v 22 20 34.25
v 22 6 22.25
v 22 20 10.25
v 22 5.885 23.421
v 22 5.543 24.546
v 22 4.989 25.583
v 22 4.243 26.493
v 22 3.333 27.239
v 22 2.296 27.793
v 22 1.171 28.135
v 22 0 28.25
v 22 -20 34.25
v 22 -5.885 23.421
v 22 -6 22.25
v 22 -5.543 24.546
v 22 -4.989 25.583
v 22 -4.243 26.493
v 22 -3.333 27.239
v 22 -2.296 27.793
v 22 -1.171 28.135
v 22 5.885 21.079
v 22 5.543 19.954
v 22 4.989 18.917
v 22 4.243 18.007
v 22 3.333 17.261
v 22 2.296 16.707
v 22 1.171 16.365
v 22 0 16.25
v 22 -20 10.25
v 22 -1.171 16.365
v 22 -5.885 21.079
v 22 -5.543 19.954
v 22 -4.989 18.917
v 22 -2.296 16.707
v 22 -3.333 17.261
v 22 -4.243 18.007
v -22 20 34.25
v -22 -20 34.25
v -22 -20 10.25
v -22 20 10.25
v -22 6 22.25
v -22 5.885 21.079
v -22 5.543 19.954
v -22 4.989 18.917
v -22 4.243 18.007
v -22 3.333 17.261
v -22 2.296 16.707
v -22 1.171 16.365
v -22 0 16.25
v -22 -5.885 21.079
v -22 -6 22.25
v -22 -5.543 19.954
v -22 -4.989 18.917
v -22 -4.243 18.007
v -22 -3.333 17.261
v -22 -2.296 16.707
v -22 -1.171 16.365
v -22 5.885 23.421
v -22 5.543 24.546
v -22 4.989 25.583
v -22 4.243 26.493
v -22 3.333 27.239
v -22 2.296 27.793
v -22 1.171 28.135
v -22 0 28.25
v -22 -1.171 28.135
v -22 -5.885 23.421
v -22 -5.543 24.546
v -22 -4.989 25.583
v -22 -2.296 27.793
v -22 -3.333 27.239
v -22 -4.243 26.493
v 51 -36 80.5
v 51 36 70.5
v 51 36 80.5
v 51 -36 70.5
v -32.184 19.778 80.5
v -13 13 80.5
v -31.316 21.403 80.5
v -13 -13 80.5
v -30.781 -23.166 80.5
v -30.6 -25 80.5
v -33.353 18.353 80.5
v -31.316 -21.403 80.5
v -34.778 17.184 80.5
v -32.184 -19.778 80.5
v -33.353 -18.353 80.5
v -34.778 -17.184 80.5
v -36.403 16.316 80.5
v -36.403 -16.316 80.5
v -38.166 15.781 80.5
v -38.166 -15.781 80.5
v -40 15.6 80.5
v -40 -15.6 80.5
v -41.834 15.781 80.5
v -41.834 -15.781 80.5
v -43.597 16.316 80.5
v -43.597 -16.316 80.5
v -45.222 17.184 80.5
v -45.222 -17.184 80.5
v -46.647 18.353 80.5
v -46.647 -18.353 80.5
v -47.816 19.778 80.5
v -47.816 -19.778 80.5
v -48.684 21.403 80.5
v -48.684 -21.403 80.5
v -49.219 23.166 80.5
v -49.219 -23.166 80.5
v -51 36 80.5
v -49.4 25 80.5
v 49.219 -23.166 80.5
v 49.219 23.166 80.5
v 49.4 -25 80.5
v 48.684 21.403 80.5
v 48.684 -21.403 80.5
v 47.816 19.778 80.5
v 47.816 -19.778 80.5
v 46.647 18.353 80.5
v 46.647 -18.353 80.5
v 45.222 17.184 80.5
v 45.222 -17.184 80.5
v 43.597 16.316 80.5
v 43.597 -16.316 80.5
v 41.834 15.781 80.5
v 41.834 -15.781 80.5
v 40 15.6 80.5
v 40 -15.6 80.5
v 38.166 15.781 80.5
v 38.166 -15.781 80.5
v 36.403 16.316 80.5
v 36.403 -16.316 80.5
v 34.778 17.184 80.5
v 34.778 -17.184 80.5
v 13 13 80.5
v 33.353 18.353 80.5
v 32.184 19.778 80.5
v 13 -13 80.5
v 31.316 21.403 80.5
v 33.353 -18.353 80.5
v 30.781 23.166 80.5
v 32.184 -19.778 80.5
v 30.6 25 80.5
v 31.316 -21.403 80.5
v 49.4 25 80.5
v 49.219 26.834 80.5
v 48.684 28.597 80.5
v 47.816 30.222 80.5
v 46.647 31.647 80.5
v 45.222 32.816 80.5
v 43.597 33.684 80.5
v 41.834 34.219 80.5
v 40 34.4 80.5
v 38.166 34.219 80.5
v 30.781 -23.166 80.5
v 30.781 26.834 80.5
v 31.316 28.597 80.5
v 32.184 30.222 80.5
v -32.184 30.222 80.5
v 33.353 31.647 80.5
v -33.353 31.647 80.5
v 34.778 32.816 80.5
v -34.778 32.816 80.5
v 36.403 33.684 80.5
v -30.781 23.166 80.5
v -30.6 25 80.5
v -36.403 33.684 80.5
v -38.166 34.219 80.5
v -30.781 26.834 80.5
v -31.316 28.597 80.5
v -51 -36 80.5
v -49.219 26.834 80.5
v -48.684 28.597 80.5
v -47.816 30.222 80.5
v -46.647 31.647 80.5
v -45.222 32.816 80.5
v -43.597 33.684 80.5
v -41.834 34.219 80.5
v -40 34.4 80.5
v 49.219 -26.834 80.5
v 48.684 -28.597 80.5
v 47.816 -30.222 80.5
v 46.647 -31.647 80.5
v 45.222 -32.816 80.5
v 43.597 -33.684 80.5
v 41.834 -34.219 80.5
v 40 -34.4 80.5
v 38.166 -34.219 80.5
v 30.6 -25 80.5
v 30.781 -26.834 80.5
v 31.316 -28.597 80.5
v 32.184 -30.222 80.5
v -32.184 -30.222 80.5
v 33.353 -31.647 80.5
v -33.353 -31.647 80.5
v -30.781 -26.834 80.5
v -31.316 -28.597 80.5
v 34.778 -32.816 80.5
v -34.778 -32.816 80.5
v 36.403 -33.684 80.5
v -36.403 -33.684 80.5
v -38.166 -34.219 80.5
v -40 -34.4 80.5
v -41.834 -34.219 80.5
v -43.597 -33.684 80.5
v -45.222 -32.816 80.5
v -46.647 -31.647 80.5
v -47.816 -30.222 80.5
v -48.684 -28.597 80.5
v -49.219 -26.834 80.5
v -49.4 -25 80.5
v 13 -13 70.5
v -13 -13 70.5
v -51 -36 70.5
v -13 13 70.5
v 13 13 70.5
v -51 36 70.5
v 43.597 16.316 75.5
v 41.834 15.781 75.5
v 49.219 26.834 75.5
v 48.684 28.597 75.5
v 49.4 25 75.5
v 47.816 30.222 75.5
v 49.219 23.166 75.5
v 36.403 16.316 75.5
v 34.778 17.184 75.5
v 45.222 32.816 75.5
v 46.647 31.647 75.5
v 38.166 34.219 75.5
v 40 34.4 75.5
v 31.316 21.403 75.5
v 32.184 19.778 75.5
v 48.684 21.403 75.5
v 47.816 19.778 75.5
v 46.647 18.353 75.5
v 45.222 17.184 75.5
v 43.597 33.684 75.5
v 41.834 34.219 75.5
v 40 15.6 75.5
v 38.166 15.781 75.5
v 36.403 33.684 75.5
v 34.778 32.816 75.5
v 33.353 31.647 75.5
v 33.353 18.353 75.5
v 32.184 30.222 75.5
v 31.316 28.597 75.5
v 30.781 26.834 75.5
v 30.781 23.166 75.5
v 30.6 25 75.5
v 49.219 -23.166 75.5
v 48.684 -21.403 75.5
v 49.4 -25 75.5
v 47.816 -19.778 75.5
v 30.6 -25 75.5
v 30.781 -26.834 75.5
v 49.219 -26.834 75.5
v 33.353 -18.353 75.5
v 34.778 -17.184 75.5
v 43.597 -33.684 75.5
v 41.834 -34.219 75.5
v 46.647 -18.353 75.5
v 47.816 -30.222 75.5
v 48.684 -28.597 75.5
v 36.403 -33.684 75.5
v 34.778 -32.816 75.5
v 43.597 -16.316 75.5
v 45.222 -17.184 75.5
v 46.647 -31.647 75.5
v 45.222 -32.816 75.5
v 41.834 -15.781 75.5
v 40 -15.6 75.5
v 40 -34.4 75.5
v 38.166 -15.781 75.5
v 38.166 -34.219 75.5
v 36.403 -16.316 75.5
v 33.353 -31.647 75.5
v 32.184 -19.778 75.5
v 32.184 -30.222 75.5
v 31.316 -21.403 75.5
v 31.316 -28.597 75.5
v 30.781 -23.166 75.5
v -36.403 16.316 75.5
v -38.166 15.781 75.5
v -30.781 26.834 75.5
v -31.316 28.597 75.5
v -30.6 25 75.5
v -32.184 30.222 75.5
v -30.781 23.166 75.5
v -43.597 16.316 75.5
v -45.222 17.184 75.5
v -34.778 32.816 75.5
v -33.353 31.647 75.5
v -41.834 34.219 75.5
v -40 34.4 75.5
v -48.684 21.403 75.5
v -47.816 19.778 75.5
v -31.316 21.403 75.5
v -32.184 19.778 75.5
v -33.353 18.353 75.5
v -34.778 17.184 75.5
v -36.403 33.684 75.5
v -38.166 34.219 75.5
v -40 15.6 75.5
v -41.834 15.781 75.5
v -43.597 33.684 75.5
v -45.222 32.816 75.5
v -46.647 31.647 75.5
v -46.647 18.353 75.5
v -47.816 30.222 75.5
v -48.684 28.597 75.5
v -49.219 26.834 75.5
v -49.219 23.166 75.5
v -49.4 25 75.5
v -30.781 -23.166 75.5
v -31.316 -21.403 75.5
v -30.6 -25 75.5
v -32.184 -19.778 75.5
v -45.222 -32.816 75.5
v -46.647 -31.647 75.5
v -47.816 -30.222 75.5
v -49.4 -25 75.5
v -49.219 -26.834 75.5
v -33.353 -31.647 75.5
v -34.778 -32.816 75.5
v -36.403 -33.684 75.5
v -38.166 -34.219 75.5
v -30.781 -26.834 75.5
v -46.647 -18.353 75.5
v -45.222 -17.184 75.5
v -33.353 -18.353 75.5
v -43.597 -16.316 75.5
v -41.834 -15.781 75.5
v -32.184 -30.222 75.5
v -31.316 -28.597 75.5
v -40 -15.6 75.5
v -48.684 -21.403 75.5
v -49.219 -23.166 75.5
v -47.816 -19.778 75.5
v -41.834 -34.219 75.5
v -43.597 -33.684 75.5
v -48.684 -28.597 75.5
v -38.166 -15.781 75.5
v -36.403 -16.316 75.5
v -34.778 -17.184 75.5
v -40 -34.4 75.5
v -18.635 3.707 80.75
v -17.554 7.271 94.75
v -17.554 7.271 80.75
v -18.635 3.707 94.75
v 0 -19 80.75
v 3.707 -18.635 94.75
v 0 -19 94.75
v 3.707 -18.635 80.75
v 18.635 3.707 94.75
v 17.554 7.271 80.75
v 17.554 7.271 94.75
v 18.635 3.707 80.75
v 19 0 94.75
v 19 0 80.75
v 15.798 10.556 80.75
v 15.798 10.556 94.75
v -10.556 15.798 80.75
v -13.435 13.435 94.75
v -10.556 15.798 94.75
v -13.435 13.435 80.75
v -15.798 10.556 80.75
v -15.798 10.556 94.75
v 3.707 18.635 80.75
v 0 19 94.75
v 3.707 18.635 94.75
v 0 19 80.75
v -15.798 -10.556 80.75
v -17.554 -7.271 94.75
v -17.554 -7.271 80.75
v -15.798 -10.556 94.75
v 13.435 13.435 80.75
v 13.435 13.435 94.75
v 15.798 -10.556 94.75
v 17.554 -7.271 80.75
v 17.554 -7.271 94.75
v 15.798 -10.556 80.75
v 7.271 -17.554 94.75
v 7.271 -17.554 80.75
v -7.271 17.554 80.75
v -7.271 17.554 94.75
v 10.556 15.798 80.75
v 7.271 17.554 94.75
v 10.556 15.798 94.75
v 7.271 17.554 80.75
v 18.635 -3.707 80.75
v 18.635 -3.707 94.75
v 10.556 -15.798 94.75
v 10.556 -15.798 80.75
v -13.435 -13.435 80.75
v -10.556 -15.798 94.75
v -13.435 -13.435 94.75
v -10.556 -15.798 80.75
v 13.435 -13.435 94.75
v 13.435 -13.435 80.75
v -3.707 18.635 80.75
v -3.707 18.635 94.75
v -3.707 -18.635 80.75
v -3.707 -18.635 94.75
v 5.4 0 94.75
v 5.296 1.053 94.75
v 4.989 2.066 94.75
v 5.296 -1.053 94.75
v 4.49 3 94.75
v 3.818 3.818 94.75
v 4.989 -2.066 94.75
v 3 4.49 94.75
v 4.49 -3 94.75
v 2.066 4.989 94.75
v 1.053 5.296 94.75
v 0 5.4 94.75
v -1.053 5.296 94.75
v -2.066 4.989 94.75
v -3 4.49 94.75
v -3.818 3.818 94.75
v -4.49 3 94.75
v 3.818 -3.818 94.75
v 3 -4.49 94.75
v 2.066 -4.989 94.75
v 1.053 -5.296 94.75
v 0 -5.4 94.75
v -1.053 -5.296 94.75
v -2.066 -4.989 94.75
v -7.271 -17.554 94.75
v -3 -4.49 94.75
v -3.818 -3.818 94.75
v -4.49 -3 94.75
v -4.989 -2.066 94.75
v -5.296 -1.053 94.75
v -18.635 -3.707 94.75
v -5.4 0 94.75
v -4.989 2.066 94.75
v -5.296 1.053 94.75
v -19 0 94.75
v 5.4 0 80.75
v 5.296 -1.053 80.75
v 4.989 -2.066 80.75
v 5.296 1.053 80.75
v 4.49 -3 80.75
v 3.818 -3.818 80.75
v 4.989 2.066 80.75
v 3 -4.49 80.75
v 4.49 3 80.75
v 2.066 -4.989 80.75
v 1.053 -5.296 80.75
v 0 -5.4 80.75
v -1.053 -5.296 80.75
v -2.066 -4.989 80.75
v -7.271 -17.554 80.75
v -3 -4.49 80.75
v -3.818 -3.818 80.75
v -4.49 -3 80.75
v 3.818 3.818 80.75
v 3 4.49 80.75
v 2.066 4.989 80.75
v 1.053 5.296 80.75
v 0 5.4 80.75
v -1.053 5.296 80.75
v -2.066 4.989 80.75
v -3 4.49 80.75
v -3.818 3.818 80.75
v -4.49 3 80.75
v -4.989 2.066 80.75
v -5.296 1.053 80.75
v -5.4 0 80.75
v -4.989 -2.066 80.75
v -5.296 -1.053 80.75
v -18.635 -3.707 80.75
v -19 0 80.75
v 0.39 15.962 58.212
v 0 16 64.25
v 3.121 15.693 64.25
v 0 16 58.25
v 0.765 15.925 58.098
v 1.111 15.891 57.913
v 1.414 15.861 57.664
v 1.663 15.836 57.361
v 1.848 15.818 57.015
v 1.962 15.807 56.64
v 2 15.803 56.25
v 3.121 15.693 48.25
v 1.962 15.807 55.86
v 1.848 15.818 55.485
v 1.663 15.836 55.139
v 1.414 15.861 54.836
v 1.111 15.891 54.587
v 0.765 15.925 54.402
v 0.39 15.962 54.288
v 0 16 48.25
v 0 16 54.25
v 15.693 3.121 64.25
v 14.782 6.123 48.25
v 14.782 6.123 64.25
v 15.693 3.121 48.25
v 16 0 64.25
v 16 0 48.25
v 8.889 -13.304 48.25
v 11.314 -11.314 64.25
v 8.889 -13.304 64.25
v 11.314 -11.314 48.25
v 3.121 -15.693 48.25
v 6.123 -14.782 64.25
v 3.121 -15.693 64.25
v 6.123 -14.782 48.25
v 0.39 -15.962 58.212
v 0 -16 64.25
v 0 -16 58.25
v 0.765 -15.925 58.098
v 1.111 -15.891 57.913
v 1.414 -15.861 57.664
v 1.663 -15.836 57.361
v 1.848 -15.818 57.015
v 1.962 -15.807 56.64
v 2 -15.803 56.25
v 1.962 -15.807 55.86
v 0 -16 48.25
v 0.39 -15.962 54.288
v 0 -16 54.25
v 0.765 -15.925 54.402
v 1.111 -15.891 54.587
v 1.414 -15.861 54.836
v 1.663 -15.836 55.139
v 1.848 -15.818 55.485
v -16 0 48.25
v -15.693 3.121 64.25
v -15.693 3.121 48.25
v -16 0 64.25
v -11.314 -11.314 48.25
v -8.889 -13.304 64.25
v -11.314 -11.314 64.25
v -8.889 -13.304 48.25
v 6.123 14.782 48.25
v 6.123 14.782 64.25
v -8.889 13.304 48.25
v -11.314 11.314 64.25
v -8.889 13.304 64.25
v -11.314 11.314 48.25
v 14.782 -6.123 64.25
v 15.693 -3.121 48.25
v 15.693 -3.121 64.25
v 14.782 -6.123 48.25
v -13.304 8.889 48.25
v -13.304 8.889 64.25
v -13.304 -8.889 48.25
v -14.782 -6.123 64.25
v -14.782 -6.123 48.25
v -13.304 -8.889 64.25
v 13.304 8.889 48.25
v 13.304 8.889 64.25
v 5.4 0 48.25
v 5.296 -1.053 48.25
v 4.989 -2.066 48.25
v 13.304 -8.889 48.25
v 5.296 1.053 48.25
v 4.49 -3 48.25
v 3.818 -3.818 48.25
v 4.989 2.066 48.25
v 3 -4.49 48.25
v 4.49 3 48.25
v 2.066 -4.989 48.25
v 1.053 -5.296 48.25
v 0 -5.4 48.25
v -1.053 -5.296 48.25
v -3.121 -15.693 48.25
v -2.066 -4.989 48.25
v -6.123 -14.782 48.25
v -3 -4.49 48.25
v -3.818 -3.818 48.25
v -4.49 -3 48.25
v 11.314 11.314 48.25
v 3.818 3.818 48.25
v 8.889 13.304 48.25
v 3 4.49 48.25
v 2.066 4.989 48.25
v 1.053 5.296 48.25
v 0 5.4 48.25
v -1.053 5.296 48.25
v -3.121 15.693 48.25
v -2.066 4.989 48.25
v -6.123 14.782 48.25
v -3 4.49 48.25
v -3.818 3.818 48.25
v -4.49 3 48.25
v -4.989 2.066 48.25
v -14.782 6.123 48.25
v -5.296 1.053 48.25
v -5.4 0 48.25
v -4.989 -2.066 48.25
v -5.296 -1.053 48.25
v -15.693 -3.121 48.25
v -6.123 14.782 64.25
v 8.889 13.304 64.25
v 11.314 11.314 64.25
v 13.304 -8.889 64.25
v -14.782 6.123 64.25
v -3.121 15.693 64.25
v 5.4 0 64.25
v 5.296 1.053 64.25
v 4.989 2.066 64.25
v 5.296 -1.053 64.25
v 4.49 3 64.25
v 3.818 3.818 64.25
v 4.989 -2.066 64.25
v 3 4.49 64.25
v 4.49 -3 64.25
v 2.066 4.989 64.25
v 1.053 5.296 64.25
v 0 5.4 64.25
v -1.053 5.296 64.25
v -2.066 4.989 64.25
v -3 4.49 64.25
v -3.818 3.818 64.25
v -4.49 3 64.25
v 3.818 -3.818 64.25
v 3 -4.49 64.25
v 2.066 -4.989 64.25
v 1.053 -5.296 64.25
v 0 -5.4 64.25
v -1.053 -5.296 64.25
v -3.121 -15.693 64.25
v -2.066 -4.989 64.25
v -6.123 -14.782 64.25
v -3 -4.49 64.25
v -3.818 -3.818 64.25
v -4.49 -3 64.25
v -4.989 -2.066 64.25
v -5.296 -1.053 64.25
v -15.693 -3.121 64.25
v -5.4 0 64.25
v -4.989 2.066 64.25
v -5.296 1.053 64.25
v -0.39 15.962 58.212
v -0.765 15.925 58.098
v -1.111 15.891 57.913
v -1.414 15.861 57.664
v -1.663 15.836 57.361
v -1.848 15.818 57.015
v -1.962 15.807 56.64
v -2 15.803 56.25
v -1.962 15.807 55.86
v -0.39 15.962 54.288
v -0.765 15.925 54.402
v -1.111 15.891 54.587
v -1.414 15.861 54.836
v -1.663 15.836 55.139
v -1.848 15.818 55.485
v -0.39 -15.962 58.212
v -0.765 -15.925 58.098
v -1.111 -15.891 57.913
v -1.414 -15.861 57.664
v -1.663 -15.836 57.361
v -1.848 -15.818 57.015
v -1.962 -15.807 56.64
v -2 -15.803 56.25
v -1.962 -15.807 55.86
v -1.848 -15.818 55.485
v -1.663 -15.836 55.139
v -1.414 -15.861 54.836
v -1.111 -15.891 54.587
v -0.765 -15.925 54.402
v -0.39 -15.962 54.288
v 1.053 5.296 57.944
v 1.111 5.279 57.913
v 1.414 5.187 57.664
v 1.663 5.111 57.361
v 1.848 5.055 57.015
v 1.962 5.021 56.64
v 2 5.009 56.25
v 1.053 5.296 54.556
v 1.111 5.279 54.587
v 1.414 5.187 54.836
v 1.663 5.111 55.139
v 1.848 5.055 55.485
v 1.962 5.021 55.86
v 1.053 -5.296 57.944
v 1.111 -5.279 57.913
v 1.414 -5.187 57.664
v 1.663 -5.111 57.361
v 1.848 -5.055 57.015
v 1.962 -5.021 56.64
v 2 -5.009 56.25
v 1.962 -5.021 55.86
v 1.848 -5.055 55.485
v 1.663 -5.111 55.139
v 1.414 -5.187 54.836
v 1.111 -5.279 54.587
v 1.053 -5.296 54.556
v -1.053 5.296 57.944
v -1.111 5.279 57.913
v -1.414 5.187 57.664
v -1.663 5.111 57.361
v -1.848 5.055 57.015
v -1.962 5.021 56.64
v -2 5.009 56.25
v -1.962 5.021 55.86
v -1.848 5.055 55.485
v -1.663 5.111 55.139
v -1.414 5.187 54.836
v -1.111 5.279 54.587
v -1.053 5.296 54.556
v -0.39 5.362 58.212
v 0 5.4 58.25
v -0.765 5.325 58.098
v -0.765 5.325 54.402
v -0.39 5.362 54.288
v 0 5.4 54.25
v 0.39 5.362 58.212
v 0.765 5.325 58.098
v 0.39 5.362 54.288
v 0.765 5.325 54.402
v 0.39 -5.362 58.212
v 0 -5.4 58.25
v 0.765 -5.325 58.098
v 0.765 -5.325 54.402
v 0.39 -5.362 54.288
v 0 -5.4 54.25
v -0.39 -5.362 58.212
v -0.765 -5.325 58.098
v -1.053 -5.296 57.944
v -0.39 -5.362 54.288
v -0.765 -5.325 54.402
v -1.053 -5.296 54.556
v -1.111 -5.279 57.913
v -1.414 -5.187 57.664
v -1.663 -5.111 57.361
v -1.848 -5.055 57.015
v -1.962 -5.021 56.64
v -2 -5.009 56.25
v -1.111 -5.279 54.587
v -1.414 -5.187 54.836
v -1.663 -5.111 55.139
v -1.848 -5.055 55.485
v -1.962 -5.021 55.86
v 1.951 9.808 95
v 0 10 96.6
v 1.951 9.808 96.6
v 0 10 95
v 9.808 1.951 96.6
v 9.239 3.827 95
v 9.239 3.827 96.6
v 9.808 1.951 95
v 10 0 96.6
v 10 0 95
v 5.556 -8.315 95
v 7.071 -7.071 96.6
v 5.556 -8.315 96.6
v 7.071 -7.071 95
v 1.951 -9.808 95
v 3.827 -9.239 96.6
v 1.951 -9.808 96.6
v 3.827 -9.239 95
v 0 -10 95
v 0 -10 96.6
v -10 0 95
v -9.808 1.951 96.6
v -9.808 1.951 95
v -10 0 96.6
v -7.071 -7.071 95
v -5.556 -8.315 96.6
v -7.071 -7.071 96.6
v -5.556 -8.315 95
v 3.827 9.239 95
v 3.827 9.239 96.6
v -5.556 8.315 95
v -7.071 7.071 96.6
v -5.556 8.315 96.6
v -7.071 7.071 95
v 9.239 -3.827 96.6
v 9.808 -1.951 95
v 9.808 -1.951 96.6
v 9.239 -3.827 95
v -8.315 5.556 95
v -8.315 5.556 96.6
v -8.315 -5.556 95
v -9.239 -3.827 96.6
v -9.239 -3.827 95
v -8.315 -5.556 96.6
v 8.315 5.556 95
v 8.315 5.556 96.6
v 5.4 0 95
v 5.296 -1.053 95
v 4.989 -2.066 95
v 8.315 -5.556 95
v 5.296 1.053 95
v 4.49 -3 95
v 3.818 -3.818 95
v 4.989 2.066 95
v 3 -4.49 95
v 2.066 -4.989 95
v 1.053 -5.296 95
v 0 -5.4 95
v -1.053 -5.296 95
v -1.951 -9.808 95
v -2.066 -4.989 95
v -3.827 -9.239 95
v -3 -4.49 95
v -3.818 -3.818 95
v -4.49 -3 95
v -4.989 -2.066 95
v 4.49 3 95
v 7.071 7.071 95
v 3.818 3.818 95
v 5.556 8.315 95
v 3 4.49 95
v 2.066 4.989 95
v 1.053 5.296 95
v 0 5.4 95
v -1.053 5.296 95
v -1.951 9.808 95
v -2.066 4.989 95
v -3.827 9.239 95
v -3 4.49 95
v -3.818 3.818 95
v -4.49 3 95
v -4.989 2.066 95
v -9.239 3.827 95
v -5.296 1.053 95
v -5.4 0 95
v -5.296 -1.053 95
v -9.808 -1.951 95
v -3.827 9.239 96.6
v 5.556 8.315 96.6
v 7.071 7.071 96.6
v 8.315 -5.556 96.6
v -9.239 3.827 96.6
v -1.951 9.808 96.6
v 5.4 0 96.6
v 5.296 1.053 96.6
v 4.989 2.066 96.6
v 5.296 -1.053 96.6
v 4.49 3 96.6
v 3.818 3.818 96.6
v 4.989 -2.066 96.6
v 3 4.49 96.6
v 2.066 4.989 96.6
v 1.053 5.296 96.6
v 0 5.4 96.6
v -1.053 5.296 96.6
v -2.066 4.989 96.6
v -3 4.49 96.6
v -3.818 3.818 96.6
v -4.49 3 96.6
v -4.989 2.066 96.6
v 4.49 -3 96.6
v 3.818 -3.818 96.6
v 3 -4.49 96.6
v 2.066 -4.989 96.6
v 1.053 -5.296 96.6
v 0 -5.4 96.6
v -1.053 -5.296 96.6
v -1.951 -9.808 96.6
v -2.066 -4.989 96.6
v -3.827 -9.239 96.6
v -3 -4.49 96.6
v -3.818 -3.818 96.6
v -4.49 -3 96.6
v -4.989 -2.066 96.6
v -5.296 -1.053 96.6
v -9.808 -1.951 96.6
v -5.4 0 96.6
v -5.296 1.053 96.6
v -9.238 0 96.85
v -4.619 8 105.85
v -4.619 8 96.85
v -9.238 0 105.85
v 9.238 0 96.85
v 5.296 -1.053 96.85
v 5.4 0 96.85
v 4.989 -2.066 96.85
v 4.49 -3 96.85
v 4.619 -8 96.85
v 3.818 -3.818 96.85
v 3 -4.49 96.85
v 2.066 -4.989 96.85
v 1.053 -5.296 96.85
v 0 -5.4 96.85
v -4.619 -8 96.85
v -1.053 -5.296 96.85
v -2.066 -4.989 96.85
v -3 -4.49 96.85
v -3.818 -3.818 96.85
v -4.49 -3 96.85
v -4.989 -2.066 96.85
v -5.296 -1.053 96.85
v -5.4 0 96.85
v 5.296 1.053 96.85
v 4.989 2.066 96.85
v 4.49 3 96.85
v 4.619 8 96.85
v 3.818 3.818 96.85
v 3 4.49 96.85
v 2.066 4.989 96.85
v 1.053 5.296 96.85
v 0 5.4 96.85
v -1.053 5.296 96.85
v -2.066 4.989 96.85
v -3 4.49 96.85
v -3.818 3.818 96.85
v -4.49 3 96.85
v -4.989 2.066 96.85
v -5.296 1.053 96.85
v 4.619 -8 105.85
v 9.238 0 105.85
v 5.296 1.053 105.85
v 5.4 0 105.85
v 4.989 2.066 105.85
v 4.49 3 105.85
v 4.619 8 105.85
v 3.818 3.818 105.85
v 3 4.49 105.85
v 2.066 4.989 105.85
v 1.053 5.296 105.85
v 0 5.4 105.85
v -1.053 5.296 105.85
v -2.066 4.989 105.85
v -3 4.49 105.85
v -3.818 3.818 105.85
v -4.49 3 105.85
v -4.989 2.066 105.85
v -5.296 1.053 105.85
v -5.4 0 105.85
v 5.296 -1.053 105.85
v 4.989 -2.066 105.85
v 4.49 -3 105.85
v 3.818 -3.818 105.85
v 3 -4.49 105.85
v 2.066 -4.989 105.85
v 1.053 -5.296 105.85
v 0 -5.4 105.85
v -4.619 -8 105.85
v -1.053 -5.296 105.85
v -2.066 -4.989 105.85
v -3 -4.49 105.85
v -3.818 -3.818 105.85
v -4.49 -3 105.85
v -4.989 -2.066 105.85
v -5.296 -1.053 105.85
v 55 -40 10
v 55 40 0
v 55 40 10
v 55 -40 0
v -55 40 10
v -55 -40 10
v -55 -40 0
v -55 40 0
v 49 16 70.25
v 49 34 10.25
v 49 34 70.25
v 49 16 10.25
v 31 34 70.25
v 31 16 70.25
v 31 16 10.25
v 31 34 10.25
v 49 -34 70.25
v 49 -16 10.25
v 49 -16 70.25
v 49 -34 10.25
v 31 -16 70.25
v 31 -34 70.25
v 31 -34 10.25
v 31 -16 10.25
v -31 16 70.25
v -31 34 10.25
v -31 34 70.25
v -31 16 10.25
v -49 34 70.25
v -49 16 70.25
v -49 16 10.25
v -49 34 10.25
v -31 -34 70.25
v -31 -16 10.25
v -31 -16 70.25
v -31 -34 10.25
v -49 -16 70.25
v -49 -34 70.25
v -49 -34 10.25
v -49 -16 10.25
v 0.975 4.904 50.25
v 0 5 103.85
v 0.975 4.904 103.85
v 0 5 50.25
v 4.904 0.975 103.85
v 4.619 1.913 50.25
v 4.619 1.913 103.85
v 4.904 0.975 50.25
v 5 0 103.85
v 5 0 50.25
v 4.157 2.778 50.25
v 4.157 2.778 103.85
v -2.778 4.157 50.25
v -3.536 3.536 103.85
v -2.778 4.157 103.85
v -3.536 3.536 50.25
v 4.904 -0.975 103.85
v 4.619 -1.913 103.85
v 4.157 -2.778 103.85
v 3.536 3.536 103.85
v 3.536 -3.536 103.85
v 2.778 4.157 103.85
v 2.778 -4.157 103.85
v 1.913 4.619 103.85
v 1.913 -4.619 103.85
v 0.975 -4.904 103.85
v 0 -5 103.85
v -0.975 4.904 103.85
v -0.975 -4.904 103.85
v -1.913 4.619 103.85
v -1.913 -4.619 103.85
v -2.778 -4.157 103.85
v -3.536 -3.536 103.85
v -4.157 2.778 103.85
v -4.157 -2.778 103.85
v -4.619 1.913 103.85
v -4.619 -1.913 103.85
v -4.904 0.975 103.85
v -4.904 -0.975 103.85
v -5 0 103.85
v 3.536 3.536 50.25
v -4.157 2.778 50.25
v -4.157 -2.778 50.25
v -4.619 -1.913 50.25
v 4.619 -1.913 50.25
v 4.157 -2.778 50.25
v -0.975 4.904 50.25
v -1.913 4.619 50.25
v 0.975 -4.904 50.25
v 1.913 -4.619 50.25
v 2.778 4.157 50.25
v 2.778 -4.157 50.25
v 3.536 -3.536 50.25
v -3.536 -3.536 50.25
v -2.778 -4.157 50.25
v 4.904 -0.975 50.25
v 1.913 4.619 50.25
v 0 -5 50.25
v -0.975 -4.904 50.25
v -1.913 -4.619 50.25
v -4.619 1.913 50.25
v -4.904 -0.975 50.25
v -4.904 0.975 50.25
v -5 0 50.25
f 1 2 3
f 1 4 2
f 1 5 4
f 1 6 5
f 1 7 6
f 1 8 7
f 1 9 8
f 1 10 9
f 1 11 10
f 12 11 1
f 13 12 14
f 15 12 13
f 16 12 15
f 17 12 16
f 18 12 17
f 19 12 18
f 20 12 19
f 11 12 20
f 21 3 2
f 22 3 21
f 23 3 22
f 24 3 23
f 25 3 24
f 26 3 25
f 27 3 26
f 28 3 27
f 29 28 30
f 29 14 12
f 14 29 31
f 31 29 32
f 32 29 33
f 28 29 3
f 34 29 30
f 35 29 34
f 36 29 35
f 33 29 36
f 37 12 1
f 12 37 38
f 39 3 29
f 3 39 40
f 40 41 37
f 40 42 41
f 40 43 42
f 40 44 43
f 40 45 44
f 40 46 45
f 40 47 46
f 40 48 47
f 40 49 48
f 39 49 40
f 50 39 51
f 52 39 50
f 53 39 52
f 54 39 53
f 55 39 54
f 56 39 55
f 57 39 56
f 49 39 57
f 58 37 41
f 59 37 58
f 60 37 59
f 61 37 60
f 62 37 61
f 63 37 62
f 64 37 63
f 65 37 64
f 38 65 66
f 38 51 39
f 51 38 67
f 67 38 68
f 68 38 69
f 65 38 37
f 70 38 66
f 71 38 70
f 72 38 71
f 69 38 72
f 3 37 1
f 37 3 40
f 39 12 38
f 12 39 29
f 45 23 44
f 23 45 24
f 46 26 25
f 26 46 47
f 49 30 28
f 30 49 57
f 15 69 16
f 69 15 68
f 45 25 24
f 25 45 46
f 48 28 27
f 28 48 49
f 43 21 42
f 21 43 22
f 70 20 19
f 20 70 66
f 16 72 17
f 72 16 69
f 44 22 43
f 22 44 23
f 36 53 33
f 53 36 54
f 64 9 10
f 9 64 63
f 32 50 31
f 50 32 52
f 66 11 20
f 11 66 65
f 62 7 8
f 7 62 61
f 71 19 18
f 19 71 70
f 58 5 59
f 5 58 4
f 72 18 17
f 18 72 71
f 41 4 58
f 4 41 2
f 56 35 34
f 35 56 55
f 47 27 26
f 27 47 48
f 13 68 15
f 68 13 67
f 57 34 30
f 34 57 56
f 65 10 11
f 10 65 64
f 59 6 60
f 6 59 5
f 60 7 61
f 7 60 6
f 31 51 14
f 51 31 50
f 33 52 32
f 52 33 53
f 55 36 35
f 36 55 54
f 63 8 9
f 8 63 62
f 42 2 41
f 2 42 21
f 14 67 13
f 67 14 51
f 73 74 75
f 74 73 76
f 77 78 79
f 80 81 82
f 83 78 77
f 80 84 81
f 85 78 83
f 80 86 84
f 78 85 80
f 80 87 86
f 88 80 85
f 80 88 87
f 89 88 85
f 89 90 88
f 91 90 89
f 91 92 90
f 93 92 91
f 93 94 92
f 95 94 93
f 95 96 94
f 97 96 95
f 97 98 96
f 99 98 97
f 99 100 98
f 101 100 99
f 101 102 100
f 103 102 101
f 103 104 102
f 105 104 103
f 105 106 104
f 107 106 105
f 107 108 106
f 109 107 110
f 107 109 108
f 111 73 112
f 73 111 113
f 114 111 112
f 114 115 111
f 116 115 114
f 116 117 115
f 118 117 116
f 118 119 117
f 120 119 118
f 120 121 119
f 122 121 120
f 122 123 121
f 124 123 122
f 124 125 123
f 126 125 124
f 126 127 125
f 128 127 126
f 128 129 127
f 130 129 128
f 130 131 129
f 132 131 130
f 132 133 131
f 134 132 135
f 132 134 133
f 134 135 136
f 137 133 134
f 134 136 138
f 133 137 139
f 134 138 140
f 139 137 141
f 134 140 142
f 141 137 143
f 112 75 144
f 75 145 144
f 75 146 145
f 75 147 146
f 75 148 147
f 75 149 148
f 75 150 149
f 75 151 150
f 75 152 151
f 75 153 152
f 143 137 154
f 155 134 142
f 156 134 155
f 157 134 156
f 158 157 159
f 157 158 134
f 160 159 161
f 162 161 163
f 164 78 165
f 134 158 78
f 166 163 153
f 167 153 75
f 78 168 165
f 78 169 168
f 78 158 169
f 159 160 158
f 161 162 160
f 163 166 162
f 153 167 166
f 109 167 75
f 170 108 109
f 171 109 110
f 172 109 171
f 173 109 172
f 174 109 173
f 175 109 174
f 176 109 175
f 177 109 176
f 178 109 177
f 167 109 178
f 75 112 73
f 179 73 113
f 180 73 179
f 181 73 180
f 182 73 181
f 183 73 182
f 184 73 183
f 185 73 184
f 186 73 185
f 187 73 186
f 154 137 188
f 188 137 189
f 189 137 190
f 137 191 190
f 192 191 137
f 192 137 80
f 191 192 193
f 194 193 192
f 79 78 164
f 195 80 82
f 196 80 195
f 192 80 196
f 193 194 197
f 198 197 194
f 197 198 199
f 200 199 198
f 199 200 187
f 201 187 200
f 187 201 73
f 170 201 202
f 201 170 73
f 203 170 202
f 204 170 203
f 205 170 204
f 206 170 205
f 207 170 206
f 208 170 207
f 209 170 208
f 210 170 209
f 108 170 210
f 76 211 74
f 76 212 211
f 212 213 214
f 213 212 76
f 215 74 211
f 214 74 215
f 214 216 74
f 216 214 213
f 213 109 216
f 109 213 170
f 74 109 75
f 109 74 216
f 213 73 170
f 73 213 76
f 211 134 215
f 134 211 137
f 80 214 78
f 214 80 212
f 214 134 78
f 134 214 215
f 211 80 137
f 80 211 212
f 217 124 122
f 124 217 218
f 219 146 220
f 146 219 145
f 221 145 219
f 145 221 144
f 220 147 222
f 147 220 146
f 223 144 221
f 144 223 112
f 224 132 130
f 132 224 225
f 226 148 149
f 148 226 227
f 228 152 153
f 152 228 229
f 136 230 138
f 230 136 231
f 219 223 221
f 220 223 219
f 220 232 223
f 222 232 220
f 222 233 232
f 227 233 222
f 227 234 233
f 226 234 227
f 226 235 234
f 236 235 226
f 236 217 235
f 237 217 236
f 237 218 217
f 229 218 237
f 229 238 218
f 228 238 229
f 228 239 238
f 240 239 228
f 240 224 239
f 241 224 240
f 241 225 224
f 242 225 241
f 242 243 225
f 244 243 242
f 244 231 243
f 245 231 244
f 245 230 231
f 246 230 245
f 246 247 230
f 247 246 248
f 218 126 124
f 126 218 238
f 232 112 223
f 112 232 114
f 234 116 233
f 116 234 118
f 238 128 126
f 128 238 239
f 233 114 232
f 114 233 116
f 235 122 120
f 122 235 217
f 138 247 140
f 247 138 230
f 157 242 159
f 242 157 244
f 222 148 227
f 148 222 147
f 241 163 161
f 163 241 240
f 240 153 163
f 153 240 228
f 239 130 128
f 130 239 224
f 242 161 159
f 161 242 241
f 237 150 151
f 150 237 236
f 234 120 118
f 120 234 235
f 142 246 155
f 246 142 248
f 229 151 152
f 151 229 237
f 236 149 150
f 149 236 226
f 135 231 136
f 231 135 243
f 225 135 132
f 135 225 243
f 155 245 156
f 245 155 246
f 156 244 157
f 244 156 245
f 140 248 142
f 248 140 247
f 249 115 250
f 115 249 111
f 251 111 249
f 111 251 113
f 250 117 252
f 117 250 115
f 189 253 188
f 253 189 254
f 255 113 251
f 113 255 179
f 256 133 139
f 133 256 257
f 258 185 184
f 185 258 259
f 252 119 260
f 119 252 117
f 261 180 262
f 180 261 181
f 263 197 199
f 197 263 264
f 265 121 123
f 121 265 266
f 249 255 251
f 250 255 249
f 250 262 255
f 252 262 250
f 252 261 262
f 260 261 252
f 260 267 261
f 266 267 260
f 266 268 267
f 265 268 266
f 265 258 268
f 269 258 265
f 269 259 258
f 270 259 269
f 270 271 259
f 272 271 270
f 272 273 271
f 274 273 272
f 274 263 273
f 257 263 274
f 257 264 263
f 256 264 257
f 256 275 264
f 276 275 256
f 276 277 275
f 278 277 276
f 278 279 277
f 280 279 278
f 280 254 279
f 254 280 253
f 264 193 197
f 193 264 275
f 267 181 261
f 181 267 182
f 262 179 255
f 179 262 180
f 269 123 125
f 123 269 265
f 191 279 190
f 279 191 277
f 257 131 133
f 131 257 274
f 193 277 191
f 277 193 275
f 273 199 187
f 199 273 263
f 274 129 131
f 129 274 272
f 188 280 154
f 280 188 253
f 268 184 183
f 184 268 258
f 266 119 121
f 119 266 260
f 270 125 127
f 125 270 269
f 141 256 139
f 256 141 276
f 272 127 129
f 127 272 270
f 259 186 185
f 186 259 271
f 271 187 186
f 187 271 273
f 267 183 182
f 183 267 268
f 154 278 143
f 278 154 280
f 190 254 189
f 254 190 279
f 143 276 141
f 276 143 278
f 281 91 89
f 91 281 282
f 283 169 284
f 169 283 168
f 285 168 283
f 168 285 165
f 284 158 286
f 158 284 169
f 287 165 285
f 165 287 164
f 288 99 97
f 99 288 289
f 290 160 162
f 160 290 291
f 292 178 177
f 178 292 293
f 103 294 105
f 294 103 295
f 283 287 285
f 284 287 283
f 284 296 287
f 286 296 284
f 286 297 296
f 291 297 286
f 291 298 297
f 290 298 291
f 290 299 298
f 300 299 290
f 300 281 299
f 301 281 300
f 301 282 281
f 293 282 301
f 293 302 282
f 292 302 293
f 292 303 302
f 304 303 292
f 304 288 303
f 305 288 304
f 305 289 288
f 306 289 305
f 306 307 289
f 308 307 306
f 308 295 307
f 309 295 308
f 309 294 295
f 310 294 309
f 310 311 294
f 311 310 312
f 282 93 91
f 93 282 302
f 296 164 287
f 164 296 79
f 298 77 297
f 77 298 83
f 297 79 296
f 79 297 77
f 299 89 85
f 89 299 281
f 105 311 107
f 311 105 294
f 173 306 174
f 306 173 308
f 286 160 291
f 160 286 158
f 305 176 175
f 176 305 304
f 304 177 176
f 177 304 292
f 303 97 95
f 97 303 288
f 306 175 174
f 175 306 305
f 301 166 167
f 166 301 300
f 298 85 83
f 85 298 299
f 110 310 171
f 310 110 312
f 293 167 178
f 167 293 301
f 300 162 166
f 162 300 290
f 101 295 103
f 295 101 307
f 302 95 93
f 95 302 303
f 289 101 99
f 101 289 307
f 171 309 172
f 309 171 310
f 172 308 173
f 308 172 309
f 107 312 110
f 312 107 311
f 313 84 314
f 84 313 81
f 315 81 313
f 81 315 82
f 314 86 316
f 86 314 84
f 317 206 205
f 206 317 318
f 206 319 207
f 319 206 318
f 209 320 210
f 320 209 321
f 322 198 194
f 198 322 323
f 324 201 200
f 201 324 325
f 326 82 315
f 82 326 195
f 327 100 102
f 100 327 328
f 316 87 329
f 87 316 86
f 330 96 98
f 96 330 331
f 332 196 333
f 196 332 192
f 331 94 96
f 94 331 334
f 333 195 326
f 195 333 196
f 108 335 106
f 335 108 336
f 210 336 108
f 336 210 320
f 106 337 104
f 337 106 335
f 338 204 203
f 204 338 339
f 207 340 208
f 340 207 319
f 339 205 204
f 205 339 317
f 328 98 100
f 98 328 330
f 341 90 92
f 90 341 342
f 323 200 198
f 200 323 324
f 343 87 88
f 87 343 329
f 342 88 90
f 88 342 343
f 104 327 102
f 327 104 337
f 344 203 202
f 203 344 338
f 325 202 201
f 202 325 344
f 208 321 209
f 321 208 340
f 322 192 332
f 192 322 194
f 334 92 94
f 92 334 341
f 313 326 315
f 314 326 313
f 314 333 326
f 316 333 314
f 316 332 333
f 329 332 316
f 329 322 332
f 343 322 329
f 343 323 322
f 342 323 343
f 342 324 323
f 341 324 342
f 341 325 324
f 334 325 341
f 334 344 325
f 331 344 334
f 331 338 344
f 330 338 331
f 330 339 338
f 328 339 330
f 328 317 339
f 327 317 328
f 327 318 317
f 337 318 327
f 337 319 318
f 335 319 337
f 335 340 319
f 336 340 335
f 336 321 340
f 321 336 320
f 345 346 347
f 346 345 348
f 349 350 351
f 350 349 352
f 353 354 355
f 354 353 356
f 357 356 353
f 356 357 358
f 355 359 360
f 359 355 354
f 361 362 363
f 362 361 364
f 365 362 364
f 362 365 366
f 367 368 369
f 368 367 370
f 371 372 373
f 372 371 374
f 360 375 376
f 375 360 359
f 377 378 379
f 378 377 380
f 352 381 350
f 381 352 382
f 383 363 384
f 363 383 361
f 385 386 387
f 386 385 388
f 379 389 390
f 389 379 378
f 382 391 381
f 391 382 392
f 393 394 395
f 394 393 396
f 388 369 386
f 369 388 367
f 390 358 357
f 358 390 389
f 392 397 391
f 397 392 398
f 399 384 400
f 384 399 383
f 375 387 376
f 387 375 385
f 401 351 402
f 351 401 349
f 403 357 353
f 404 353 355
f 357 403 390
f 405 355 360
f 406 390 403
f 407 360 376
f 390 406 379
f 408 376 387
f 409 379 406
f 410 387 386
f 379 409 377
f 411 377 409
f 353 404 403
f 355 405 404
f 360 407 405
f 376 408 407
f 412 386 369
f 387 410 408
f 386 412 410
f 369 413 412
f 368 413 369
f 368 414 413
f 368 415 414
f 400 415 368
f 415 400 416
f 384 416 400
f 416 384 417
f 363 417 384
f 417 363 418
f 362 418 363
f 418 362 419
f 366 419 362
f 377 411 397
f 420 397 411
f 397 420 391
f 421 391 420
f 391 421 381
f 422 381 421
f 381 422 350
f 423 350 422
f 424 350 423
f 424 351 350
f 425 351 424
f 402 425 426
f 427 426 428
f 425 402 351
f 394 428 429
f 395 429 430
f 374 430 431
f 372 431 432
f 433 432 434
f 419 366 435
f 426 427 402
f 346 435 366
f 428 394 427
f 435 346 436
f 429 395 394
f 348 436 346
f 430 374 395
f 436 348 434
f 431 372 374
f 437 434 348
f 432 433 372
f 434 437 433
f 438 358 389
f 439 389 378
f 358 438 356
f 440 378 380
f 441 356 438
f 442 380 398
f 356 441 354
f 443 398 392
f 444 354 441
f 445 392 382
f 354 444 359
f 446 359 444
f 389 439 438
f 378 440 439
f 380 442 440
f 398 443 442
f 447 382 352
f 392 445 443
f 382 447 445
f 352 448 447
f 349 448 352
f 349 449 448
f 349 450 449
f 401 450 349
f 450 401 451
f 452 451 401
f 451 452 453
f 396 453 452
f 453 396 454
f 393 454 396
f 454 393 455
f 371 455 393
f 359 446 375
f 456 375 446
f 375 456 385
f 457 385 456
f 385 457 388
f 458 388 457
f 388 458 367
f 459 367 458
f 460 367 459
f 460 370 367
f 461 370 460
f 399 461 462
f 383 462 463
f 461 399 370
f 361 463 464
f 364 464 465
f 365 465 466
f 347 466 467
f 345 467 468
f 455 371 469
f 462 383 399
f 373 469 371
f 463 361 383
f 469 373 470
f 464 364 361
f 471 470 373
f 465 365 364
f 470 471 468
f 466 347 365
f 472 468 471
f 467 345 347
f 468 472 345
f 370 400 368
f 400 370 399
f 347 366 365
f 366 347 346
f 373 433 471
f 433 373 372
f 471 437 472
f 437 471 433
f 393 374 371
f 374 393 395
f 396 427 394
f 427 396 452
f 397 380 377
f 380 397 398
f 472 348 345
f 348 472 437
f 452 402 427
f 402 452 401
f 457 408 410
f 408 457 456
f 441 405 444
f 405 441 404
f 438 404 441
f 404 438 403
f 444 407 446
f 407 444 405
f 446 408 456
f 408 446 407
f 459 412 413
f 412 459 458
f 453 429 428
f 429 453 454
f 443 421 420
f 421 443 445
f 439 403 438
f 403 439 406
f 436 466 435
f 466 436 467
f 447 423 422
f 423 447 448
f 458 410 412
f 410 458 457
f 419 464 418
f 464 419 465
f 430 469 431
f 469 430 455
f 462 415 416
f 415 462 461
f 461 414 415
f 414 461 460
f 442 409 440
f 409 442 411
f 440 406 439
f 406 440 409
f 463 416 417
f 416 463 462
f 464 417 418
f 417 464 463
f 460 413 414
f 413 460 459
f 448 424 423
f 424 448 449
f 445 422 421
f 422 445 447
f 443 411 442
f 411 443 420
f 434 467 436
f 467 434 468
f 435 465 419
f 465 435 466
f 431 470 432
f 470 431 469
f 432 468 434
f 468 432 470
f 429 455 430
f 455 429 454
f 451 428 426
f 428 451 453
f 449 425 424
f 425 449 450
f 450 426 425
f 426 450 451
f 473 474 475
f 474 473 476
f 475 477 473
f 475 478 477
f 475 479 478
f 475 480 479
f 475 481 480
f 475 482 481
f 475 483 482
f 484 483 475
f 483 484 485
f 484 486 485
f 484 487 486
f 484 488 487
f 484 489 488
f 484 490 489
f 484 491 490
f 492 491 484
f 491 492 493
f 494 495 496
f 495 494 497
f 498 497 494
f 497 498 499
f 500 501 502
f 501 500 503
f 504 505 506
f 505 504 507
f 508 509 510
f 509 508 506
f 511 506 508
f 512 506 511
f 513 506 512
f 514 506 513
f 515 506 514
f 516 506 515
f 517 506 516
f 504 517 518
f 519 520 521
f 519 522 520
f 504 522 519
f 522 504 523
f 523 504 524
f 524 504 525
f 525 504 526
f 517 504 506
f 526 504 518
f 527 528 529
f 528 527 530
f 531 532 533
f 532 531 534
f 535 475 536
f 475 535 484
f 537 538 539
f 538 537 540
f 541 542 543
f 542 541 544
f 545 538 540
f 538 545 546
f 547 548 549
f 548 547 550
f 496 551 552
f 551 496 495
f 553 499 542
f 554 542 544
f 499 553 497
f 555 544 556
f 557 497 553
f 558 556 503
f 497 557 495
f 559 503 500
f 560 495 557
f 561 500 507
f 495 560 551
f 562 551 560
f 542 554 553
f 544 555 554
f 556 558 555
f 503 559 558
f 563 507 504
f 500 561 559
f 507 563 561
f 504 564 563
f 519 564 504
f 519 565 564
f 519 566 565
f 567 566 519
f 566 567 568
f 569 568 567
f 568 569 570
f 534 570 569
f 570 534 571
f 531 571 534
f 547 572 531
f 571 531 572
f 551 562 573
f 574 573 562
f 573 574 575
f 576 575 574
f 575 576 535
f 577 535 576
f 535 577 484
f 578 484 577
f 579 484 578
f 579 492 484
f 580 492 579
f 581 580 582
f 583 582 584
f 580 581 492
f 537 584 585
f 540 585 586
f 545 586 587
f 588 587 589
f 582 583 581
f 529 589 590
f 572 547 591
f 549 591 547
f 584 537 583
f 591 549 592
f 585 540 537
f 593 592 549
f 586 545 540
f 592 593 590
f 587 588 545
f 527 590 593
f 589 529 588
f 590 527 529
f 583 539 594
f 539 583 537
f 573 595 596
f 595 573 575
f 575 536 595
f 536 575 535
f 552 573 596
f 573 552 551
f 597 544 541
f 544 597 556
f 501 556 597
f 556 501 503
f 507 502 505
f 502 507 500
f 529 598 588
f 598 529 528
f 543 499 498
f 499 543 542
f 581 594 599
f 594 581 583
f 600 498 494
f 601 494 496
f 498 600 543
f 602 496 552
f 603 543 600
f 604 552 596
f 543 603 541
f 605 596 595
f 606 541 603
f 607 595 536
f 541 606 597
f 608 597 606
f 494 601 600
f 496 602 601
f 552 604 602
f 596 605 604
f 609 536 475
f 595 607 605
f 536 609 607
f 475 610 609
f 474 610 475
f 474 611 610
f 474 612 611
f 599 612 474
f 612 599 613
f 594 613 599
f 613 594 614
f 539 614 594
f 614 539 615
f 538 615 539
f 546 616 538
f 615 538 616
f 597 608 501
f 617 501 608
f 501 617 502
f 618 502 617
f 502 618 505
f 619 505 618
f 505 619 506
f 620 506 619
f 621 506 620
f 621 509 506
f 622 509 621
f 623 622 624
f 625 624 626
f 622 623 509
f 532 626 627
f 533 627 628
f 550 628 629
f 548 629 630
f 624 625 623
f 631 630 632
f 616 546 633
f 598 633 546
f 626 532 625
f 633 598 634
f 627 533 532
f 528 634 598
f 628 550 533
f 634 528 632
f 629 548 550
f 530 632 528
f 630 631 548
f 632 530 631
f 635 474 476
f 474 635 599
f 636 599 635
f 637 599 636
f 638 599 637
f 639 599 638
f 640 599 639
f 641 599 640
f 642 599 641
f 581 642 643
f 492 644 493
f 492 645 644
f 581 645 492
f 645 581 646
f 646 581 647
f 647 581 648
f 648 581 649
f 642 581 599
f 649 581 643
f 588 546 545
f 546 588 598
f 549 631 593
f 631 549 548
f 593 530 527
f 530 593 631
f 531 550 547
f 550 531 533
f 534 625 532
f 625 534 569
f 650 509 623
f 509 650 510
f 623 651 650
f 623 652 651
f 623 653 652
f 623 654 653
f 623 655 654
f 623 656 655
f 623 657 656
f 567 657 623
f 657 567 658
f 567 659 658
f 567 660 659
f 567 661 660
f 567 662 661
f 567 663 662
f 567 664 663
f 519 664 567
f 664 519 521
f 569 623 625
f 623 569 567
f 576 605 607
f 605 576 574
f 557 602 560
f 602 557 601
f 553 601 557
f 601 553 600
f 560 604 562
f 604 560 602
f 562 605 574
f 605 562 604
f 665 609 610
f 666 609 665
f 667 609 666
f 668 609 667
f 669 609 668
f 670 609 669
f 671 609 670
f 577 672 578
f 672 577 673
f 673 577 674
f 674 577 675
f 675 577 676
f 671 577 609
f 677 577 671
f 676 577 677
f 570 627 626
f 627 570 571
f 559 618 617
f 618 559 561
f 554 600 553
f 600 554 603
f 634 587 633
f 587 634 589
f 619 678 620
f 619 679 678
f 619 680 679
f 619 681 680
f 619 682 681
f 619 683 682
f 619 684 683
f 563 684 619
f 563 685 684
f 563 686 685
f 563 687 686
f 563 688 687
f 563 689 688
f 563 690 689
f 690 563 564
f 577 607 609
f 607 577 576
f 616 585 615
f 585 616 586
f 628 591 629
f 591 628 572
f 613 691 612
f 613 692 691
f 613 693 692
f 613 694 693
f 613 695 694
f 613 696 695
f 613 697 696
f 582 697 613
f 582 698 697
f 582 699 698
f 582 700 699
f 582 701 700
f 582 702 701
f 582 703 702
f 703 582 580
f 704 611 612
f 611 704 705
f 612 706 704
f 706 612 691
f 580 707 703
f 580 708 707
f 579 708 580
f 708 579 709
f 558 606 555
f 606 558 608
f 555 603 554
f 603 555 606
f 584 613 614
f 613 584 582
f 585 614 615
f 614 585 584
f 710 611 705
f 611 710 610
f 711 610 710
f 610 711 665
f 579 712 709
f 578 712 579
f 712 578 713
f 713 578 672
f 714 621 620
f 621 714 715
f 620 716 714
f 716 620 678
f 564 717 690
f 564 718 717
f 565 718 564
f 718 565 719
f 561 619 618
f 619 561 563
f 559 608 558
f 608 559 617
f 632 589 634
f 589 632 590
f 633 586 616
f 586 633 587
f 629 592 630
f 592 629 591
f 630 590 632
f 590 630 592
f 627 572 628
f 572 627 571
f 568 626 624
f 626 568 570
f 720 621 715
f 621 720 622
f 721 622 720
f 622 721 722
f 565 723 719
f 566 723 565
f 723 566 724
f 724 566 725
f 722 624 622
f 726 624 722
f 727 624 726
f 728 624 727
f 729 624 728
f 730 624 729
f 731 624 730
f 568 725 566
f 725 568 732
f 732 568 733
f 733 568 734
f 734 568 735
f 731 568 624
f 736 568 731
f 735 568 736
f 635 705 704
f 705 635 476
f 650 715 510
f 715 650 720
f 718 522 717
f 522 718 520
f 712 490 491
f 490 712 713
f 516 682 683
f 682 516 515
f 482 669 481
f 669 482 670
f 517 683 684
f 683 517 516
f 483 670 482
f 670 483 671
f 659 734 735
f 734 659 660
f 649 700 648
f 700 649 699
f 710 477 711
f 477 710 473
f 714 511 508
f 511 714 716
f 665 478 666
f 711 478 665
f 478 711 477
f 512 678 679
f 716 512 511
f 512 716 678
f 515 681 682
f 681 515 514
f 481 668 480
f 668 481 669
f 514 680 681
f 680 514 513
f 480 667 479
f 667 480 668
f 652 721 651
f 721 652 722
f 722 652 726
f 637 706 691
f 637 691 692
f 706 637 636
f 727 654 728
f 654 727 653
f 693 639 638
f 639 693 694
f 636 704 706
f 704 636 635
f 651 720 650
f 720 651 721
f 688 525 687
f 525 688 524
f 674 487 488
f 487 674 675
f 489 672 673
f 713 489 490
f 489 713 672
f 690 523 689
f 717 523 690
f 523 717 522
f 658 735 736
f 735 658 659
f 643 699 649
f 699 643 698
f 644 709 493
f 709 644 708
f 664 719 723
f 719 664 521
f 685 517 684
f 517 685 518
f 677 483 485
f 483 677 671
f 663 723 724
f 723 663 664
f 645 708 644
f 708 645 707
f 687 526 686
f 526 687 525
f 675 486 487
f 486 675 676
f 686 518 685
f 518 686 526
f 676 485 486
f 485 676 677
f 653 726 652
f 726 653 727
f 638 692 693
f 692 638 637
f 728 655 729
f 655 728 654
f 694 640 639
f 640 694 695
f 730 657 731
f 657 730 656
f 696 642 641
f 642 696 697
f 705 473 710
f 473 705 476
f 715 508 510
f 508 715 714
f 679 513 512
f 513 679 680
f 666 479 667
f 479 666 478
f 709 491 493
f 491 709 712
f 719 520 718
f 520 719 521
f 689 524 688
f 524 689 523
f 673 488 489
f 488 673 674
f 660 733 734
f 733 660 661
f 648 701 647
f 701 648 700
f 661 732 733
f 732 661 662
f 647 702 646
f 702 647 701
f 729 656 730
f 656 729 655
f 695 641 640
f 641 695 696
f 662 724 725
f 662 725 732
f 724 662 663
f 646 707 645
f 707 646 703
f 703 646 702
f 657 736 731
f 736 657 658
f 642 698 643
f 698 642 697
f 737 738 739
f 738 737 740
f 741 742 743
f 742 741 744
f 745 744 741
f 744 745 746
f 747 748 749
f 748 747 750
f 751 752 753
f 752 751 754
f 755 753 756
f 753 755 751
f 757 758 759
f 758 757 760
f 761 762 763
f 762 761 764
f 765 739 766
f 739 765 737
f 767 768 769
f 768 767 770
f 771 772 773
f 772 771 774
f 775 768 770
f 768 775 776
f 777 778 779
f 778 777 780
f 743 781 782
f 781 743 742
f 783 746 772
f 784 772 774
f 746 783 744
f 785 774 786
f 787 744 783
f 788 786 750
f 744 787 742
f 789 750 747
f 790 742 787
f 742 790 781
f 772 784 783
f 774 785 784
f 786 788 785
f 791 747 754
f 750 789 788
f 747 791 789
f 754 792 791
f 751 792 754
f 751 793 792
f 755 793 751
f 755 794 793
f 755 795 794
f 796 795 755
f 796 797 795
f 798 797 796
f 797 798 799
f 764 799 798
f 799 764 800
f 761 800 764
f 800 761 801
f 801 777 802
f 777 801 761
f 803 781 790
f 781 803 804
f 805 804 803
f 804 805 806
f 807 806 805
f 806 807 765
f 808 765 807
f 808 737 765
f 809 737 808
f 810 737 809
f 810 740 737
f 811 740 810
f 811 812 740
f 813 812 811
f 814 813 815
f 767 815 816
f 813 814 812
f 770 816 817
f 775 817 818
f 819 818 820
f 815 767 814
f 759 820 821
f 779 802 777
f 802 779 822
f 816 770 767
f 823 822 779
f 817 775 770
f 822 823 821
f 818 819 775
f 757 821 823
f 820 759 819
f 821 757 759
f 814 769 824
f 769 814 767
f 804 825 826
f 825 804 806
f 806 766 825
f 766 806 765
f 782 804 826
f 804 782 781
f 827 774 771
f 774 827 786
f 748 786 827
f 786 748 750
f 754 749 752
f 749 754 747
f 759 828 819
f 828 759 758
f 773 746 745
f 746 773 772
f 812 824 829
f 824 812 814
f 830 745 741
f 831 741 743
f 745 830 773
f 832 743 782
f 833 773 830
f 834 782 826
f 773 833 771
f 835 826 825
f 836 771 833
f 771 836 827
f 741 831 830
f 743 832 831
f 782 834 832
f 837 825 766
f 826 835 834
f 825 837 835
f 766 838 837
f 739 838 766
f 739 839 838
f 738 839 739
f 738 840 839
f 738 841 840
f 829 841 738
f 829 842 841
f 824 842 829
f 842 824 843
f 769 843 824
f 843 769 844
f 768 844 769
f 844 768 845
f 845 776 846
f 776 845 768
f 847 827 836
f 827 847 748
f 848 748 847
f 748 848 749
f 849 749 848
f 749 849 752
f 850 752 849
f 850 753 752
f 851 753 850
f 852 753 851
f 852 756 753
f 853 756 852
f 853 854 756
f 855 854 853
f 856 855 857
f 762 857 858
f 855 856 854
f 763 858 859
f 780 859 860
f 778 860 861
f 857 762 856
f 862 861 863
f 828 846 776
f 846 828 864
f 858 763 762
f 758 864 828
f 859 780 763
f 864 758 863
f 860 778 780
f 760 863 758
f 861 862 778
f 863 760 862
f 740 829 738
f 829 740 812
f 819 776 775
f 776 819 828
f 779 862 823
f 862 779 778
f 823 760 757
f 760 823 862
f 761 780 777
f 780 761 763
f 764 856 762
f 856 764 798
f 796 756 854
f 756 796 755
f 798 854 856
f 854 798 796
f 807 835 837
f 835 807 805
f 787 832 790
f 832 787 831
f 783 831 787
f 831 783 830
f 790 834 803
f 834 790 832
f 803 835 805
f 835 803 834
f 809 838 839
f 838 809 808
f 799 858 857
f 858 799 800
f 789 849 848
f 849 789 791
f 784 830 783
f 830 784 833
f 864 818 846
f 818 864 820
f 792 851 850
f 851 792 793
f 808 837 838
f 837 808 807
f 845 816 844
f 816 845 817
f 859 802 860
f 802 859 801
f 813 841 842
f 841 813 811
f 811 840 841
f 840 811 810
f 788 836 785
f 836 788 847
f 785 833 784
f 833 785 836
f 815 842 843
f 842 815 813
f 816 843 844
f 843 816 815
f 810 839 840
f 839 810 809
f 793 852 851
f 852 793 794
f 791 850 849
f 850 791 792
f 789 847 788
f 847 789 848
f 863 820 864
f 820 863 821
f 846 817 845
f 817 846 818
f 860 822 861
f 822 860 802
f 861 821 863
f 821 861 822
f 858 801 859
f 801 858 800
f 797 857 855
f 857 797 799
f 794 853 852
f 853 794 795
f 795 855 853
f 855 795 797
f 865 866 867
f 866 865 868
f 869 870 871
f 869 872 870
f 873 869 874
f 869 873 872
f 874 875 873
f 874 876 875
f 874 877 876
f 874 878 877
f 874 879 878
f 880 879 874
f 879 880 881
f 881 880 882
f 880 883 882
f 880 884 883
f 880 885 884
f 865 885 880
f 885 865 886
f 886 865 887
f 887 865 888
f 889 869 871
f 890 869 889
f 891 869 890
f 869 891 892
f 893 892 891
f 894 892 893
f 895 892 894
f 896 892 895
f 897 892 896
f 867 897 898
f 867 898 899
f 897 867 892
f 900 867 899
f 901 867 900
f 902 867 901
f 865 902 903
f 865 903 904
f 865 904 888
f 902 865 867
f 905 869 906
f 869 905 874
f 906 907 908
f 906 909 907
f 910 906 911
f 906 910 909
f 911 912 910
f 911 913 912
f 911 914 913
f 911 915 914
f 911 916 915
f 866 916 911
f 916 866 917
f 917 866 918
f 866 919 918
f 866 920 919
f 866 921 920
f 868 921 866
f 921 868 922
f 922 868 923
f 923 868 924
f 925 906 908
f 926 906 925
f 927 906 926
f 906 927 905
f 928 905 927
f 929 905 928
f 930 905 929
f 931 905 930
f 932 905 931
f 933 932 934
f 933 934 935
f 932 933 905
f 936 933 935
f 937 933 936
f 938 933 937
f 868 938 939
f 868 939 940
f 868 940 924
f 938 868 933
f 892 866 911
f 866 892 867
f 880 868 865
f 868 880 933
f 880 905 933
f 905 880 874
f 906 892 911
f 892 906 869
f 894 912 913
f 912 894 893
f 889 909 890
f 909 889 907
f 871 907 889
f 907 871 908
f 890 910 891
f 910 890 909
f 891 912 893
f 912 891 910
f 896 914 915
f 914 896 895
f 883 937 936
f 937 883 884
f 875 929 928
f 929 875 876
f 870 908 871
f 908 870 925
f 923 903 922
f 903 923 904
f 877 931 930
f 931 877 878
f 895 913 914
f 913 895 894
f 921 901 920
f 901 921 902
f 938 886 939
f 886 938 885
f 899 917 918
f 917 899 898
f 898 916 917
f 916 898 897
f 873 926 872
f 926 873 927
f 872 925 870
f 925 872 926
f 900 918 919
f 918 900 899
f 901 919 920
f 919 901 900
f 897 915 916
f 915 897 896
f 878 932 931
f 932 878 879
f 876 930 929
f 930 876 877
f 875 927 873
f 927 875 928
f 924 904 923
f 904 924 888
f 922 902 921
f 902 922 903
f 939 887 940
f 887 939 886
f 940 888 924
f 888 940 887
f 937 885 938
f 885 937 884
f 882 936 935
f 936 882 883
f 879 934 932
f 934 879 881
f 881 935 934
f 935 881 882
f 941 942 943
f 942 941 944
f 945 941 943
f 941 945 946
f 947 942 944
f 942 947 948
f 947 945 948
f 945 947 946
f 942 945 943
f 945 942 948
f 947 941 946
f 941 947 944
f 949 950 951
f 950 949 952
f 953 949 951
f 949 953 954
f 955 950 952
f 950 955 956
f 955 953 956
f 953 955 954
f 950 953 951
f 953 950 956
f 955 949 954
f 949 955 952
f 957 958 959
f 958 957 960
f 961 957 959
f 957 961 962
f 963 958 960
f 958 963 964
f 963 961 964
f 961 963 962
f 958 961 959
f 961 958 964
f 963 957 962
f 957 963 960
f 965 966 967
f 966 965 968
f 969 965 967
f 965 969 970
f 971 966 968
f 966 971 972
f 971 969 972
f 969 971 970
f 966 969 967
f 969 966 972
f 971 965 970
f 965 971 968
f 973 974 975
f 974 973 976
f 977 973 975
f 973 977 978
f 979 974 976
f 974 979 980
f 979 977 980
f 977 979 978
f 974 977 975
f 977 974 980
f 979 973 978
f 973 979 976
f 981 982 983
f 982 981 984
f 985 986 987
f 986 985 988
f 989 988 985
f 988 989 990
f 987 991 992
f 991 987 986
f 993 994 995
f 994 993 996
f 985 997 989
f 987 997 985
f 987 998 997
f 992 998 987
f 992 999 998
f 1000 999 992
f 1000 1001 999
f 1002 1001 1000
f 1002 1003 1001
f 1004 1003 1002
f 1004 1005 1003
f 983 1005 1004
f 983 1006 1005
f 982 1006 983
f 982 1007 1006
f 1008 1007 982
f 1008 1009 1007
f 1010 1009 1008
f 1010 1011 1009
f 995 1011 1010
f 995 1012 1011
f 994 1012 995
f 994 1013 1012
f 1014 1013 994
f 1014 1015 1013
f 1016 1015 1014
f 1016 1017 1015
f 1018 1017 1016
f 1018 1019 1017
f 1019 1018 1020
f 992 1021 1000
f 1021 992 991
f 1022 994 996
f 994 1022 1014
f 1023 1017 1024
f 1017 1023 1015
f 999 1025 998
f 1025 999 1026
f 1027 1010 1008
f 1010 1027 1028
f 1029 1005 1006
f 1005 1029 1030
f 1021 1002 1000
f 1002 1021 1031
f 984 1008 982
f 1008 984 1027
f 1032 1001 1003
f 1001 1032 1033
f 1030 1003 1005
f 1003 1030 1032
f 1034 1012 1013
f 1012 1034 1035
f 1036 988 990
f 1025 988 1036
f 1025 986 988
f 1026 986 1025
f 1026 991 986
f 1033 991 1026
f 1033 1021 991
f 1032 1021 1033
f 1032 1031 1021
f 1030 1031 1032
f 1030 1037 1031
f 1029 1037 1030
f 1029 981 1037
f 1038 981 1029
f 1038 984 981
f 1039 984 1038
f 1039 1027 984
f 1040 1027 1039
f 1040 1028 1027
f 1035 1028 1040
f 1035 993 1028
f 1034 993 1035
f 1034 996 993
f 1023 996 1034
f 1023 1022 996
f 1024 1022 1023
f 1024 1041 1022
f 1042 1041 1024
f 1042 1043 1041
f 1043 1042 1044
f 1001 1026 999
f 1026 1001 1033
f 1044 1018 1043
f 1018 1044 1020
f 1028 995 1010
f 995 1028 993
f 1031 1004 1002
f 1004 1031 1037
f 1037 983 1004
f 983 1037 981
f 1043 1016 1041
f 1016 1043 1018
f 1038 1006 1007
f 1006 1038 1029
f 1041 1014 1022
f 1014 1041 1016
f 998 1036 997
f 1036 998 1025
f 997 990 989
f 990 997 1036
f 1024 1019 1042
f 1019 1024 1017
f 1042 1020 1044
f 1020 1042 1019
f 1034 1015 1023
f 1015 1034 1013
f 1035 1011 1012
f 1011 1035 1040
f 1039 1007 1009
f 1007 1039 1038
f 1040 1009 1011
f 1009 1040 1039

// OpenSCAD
$fn = 32;

// ------------------------------------------------------------------------
// Arbor press fixture: screw d10, posts 60 mm, gap 14 mm
// Every part is its own module, assembly() places every instance.
// ------------------------------------------------------------------------

// --- part 1 ---
module press_bed() {
  difference() {
    translate([-55, -40, 0]) cube([110, 80, 10]);
  }
}

// --- part 2 ---
module anvil_block() {
  difference() {
    translate([-22, -20, 0]) cube([44, 40, 24]);
    translate([0, 0, 12]) rotate([0, 90, 0]) cylinder(h = 46, d = 12, center = true);
  }
}

// --- part 3 ---
module press_post_a() {
  translate([-9, -9, 0]) cube([18, 18, 60]);
}

// --- part 4 ---
module press_post_b() {
  translate([-9, -9, 0]) cube([18, 18, 60]);
}

// --- part 5 ---
module press_post_c() {
  translate([-9, -9, 0]) cube([18, 18, 60]);
}

// --- part 6 ---
module press_post_d() {
  translate([-9, -9, 0]) cube([18, 18, 60]);
}

// --- part 7 ---
module press_frame() {
  difference() {
    translate([-51, -36, 0]) cube([102, 72, 10]);
    translate([-13, -13, -1]) cube([26, 26, 12]);
    translate([40, 25, 5]) cylinder(h = 6, d = 18.8);
    translate([40, -25, 5]) cylinder(h = 6, d = 18.8);
    translate([-40, 25, 5]) cylinder(h = 6, d = 18.8);
    translate([-40, -25, 5]) cylinder(h = 6, d = 18.8);
  }
}

// --- part 8 ---
module guide_ring() {
  difference() {
      translate([0, 0, 0]) cylinder(h = 14, d = 38);
      translate([0, 0, -1]) cylinder(h = 16, d = 10.8);
    }
}

// --- part 9 ---
module press_screw() {
  translate([0, 0, -26.8]) cylinder(h = 53.6, d = 10);
}

// --- part 10 ---
module press_head() {
  difference() {
    cylinder(h = 16, d = 32);
    translate([0, 0, -1]) cylinder(h = 18, d = 10.8);
    translate([0, 0, 8]) rotate([90, 0, 0]) cylinder(h = 34, d = 4, center = true);
  }
}

// --- part 11 ---
module nut_washer() {
  difference() {
      translate([0, 0, 0]) cylinder(h = 1.6, d = 20);
      translate([0, 0, -1]) cylinder(h = 3.6, d = 10.8);
    }
}

// --- part 12 ---
module press_nut() {
  difference() {
    linear_extrude(height = 9) polygon(points = [[9.238, 0], [4.619, 8], [-4.619, 8], [-9.238, 0], [-4.619, -8], [4.619, -8]]);
    translate([0, 0, -1]) cylinder(h = 11, d = 10.8);
  }
}

// --- assembly ---
module assembly() {
  color([0.80, 0.24, 0.20]) translate([0, 0, 0]) rotate([0, 0, 0]) press_bed();
  color([0.20, 0.45, 0.75]) translate([0, 0, 10.25]) rotate([0, 0, 0]) anvil_block();
  color([0.25, 0.62, 0.32]) translate([40, 25, 10.25]) rotate([0, 0, 0]) press_post_a();
  color([0.92, 0.70, 0.18]) translate([40, -25, 10.25]) rotate([0, 0, 0]) press_post_b();
  color([0.58, 0.35, 0.70]) translate([-40, 25, 10.25]) rotate([0, 0, 0]) press_post_c();
  color([0.16, 0.66, 0.66]) translate([-40, -25, 10.25]) rotate([0, 0, 0]) press_post_d();
  color([0.85, 0.48, 0.18]) translate([0, 0, 70.5]) rotate([0, 0, 0]) press_frame();
  color([0.55, 0.60, 0.65]) translate([0, 0, 80.75]) rotate([0, 0, 0]) guide_ring();
  color([0.75, 0.30, 0.55]) translate([0, 0, 77.05]) rotate([0, 0, 0]) press_screw();
  color([0.42, 0.52, 0.28]) translate([0, 0, 48.25]) rotate([0, 0, 0]) press_head();
  color([0.80, 0.24, 0.20]) translate([0, 0, 95]) rotate([0, 0, 0]) nut_washer();
  color([0.20, 0.45, 0.75]) translate([0, 0, 96.85]) rotate([0, 0, 0]) press_nut();
}

assembly();
